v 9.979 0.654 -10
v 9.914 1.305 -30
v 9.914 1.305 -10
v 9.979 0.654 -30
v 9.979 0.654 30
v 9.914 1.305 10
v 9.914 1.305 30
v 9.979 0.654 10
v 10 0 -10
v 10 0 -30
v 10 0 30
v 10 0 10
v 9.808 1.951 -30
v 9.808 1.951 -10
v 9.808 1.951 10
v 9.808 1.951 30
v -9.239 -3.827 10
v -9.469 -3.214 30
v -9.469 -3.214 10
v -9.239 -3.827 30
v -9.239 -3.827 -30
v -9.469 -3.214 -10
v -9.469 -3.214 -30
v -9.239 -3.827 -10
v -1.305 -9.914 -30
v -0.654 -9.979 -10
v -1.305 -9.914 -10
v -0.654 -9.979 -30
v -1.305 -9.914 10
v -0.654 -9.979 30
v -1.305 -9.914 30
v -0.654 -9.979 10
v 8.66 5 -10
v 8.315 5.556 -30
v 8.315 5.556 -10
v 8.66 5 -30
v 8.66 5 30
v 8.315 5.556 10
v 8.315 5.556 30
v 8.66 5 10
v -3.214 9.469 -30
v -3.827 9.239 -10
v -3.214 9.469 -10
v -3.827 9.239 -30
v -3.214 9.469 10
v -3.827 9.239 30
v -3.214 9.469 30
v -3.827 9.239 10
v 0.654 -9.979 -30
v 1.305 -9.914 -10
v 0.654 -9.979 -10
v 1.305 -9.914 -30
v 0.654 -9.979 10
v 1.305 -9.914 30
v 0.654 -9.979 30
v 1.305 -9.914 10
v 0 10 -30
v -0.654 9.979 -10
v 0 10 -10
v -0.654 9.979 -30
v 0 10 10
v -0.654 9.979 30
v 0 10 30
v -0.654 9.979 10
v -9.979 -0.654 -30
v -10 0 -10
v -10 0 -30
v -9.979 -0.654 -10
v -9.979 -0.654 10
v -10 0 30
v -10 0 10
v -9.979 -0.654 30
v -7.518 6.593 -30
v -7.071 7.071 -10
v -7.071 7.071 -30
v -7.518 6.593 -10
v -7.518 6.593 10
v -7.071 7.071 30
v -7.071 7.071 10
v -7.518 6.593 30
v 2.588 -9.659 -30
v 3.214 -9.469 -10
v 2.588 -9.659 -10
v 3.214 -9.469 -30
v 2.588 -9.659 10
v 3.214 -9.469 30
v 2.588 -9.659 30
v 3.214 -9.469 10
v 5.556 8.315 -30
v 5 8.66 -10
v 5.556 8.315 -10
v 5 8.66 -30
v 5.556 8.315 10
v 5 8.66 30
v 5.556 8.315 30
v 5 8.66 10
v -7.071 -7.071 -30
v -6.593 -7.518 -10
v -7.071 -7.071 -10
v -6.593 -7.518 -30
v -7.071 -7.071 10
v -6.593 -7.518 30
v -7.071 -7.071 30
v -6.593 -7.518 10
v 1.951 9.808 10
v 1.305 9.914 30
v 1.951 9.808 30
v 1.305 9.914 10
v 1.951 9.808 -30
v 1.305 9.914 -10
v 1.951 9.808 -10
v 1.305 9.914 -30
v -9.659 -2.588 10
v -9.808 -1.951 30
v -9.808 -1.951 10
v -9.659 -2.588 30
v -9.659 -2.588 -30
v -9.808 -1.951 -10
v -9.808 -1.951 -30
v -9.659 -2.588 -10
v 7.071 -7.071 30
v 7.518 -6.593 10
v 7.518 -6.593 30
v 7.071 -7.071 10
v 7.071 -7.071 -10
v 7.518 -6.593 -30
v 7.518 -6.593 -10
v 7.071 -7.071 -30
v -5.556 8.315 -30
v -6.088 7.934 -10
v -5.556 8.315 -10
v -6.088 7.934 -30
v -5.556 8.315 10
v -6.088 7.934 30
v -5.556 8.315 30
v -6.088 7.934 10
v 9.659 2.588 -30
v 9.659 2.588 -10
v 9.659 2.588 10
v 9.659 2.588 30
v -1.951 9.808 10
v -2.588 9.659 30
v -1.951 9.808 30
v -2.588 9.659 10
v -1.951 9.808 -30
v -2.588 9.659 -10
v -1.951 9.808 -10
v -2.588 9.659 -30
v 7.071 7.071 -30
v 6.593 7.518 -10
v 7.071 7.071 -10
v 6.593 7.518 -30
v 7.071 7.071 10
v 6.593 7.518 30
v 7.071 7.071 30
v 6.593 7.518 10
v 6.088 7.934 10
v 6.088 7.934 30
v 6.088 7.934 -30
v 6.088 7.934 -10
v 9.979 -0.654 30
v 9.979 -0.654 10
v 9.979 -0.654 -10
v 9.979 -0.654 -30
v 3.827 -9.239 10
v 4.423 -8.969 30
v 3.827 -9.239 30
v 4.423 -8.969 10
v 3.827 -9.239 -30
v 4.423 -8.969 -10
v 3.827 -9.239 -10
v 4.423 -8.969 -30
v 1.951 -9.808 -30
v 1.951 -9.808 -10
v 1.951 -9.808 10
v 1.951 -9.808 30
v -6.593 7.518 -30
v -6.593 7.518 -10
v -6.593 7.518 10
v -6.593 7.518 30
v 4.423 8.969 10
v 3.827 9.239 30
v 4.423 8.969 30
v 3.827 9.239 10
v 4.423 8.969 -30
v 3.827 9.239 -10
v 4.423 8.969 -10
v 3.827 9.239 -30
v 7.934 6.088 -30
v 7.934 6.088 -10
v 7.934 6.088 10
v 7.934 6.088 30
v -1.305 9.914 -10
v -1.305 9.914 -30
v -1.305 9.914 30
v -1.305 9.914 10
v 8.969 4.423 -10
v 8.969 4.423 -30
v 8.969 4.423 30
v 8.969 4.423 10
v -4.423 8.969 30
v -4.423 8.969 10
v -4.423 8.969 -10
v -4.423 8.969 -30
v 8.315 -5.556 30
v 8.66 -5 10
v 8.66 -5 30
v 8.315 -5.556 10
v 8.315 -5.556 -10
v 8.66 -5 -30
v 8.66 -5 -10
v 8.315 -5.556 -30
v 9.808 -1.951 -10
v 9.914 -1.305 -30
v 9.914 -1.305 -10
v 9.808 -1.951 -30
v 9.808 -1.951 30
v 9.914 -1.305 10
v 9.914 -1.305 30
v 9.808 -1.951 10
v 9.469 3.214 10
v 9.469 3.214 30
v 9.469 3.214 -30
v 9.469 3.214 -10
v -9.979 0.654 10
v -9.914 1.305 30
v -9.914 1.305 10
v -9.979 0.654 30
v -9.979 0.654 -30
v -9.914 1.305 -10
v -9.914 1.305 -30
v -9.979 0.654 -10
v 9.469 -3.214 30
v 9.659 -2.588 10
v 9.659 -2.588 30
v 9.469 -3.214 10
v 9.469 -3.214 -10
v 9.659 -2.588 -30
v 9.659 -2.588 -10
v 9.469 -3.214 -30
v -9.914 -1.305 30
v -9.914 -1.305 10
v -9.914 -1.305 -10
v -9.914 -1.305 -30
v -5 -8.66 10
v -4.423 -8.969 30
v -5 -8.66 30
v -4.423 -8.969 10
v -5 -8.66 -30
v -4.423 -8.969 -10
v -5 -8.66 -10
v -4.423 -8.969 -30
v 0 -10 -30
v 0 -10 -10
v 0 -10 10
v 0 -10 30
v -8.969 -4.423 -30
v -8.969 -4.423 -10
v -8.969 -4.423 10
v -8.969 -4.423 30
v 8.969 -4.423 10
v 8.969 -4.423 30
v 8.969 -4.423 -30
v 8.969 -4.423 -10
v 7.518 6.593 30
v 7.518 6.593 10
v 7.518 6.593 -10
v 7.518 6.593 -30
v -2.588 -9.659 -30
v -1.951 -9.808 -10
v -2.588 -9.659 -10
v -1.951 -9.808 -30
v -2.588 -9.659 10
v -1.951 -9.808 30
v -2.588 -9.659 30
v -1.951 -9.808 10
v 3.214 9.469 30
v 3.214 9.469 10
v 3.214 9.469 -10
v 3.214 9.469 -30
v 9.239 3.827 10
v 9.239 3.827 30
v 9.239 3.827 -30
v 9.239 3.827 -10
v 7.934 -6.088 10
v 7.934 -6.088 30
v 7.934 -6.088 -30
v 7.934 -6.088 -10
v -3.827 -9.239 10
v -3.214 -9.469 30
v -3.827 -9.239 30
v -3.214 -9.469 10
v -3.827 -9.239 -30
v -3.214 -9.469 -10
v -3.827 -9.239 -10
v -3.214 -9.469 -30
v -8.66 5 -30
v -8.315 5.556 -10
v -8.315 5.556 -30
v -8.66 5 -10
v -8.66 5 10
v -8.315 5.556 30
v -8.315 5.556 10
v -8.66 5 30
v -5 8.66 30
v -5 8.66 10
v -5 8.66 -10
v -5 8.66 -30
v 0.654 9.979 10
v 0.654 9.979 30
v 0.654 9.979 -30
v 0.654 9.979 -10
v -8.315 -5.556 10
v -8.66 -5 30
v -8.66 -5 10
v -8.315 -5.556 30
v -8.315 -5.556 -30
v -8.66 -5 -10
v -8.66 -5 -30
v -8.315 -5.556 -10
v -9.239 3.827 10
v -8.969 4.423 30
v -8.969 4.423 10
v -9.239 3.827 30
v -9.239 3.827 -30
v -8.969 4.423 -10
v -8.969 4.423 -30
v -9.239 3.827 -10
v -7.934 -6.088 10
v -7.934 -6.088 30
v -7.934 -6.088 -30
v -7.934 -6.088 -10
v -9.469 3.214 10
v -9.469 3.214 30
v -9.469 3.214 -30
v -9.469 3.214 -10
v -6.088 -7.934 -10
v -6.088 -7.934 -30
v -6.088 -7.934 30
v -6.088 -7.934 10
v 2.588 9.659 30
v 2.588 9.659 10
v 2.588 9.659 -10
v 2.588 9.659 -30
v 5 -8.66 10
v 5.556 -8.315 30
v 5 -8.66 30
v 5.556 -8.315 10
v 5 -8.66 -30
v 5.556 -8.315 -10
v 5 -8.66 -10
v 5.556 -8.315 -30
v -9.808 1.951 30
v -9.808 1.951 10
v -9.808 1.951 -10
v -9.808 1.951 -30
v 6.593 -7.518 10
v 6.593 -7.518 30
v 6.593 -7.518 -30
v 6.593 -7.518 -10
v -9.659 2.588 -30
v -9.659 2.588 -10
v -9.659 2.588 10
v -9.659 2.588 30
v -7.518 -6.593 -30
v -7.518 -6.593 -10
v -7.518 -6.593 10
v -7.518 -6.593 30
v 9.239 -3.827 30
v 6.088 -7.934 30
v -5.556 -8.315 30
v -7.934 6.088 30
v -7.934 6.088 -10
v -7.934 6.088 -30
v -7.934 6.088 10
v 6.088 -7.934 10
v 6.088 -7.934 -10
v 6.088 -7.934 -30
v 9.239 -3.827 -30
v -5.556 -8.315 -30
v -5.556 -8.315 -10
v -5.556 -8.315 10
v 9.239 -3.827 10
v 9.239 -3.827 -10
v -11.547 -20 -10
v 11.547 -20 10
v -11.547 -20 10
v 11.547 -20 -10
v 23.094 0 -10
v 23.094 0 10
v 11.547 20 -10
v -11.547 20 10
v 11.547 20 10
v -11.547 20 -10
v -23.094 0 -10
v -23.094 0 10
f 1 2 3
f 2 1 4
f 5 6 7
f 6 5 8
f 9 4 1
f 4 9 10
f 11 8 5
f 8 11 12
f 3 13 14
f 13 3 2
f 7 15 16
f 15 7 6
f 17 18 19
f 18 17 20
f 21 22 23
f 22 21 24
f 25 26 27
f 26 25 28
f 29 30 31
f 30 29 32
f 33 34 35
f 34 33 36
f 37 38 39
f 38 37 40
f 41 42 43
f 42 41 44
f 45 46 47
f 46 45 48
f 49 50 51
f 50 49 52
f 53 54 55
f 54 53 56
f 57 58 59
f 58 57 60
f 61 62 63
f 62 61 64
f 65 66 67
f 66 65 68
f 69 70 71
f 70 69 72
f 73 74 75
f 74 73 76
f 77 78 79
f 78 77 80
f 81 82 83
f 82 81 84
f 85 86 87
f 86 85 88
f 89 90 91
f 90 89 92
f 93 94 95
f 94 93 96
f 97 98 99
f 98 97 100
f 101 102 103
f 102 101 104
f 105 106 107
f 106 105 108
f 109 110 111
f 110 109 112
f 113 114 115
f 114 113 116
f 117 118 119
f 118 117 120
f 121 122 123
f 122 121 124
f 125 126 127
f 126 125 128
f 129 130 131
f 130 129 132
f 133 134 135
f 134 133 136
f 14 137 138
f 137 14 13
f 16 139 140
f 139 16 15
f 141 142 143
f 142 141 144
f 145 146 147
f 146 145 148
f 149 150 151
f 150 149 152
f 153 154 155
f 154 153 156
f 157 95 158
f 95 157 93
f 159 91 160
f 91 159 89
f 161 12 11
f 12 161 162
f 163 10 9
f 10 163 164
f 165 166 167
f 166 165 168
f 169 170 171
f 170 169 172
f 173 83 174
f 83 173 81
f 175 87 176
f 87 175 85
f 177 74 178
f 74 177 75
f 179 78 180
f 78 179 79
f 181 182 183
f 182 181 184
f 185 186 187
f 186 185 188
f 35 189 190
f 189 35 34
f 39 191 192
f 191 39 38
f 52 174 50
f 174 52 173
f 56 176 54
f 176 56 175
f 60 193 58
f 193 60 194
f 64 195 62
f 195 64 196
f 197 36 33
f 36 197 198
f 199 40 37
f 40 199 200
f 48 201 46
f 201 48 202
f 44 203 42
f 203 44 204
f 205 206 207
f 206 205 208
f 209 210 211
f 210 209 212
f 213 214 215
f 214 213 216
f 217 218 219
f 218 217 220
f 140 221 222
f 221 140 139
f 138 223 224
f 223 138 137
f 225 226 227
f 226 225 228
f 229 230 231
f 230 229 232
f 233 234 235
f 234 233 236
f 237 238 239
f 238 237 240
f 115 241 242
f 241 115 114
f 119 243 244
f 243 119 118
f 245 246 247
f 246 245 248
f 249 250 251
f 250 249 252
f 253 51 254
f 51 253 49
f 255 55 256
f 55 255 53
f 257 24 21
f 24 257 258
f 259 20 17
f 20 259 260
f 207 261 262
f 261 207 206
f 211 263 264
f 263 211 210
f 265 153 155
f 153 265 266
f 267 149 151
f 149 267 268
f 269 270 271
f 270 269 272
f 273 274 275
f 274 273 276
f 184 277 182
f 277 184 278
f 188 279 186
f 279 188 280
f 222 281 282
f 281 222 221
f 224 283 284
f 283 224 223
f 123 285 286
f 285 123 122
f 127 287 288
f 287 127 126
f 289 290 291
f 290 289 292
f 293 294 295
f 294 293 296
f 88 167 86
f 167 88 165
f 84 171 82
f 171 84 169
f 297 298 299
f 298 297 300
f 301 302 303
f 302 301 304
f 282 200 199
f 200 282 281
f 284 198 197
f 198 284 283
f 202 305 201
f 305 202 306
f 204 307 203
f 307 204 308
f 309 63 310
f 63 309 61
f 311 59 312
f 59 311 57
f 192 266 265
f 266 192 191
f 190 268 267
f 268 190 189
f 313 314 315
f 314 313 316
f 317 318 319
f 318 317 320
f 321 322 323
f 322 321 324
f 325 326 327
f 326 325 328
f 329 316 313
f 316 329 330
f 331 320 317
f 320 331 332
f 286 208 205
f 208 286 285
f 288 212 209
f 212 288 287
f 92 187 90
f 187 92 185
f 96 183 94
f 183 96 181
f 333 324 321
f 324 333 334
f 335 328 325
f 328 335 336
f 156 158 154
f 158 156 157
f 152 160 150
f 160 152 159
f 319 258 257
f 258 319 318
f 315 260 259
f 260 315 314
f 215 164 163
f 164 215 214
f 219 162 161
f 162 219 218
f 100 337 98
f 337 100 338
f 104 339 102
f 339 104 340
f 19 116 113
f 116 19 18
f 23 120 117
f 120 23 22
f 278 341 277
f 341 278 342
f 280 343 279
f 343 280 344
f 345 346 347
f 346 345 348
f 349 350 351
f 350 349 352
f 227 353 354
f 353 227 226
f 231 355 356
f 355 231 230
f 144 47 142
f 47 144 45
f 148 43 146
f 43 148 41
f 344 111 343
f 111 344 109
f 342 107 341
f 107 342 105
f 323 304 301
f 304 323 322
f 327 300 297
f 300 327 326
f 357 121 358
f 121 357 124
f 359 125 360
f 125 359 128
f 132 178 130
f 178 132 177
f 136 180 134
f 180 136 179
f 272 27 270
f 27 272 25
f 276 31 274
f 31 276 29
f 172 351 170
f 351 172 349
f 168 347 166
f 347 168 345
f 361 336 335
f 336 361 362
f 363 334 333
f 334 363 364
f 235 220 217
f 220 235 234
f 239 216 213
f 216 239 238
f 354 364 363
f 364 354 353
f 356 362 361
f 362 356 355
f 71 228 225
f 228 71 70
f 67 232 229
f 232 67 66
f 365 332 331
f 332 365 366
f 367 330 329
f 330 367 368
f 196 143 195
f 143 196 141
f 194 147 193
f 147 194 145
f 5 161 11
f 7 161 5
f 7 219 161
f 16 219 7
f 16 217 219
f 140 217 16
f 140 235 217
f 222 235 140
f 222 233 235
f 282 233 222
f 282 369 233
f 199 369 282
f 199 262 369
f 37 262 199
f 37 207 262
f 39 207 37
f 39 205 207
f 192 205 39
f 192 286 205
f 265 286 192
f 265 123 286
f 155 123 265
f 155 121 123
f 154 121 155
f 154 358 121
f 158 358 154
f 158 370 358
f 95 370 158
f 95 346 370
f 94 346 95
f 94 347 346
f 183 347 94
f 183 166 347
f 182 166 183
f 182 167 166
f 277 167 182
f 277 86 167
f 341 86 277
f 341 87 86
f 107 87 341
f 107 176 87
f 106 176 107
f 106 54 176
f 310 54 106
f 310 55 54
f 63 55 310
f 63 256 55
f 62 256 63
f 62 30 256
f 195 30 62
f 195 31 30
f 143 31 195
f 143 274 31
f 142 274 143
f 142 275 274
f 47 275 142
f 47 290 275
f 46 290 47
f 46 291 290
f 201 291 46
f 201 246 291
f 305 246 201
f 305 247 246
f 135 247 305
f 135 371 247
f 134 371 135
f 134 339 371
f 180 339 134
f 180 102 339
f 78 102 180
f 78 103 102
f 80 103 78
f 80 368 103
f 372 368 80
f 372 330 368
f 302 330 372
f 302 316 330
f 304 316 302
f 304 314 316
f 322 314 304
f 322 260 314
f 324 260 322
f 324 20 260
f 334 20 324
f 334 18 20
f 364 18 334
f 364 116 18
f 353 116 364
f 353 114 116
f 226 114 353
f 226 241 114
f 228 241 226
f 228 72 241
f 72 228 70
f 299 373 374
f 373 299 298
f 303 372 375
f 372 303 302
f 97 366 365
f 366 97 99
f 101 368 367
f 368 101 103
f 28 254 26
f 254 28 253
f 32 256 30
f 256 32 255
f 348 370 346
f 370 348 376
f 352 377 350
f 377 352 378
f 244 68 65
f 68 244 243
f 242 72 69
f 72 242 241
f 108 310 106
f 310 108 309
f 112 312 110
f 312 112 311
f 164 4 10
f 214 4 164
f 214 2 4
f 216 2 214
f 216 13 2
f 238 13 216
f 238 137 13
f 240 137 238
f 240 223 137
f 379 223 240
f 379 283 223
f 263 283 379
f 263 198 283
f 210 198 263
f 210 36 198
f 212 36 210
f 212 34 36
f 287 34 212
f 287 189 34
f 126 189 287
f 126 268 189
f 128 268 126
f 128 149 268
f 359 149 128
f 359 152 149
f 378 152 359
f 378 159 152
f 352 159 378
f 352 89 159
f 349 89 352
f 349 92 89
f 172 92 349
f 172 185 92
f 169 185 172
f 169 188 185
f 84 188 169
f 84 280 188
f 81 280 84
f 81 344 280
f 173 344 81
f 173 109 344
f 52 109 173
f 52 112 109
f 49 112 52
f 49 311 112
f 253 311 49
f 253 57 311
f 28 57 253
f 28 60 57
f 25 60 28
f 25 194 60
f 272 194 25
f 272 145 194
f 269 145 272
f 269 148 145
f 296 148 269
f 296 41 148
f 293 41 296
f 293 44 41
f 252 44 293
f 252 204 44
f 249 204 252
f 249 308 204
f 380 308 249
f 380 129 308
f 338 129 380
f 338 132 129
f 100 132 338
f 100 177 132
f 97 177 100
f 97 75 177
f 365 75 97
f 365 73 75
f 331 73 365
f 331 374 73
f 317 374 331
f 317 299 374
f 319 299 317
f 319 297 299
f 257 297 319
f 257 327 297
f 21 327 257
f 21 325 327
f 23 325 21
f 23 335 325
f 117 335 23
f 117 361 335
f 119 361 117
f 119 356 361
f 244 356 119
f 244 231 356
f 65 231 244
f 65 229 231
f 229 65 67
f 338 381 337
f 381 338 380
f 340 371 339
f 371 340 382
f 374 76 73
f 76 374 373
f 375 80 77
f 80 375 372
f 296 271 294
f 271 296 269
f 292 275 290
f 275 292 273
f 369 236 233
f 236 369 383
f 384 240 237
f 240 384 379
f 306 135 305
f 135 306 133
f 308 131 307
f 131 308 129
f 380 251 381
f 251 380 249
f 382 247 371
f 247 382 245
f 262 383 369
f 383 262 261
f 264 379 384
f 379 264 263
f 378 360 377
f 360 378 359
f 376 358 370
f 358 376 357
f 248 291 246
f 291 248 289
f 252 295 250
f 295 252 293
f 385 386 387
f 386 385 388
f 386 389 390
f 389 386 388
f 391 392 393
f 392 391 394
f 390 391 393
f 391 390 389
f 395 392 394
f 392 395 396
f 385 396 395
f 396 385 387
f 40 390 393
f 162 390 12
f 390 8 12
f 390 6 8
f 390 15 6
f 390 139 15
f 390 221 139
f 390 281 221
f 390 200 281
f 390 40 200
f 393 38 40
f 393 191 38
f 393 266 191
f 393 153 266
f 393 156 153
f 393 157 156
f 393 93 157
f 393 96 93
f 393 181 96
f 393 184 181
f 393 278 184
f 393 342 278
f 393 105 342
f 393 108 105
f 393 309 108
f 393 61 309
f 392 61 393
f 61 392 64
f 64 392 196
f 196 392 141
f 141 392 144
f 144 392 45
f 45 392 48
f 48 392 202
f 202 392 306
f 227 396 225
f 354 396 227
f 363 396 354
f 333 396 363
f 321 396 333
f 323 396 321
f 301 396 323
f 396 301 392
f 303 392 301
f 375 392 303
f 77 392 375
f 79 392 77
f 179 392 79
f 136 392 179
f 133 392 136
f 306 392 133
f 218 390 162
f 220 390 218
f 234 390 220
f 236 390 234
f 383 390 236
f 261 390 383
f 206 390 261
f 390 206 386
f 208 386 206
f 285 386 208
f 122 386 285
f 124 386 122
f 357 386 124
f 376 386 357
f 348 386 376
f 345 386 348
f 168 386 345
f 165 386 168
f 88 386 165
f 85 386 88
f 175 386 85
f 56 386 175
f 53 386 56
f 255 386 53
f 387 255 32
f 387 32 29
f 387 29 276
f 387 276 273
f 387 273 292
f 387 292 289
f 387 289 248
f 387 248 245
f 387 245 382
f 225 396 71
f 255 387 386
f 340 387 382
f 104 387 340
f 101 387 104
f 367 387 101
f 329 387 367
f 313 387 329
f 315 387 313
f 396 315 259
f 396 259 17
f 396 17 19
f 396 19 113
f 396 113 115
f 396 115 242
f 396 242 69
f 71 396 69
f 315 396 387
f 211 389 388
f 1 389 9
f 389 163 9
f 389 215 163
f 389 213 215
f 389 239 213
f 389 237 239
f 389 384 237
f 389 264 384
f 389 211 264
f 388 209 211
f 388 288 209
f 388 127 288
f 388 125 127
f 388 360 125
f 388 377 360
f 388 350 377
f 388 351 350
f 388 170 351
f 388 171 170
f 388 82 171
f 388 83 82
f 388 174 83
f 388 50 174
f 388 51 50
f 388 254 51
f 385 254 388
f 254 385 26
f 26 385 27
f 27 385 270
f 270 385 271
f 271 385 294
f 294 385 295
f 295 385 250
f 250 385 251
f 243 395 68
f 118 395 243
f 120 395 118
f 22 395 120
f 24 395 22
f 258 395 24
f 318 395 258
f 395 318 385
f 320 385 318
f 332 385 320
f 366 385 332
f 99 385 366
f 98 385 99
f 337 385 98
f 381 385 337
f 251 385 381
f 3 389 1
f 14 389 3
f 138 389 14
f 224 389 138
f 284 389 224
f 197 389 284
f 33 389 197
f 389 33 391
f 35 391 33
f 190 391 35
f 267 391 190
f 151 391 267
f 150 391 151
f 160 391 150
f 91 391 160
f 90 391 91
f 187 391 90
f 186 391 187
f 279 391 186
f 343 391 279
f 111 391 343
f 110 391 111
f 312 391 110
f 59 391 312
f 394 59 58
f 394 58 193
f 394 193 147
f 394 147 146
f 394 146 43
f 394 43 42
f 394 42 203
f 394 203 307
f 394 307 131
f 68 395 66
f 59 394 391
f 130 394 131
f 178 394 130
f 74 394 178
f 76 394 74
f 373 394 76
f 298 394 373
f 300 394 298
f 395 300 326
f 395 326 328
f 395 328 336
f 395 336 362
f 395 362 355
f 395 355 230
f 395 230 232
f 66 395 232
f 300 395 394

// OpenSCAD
$fn=96;

shaft_d = 20;
shaft_len = 60;

collar_af = 40;          // across flats
collar_thk = 20;

module shaft(d, l){
    cylinder(d=d, h=l, center=true);
}

module hex_collar(af, thk){
    r = af / sqrt(3);    // circumradius for given across-flats
    cylinder(r=r, h=thk, center=true, $fn=6);
}

union(){
    shaft(shaft_d, shaft_len);
    hex_collar(collar_af, collar_thk);
}
